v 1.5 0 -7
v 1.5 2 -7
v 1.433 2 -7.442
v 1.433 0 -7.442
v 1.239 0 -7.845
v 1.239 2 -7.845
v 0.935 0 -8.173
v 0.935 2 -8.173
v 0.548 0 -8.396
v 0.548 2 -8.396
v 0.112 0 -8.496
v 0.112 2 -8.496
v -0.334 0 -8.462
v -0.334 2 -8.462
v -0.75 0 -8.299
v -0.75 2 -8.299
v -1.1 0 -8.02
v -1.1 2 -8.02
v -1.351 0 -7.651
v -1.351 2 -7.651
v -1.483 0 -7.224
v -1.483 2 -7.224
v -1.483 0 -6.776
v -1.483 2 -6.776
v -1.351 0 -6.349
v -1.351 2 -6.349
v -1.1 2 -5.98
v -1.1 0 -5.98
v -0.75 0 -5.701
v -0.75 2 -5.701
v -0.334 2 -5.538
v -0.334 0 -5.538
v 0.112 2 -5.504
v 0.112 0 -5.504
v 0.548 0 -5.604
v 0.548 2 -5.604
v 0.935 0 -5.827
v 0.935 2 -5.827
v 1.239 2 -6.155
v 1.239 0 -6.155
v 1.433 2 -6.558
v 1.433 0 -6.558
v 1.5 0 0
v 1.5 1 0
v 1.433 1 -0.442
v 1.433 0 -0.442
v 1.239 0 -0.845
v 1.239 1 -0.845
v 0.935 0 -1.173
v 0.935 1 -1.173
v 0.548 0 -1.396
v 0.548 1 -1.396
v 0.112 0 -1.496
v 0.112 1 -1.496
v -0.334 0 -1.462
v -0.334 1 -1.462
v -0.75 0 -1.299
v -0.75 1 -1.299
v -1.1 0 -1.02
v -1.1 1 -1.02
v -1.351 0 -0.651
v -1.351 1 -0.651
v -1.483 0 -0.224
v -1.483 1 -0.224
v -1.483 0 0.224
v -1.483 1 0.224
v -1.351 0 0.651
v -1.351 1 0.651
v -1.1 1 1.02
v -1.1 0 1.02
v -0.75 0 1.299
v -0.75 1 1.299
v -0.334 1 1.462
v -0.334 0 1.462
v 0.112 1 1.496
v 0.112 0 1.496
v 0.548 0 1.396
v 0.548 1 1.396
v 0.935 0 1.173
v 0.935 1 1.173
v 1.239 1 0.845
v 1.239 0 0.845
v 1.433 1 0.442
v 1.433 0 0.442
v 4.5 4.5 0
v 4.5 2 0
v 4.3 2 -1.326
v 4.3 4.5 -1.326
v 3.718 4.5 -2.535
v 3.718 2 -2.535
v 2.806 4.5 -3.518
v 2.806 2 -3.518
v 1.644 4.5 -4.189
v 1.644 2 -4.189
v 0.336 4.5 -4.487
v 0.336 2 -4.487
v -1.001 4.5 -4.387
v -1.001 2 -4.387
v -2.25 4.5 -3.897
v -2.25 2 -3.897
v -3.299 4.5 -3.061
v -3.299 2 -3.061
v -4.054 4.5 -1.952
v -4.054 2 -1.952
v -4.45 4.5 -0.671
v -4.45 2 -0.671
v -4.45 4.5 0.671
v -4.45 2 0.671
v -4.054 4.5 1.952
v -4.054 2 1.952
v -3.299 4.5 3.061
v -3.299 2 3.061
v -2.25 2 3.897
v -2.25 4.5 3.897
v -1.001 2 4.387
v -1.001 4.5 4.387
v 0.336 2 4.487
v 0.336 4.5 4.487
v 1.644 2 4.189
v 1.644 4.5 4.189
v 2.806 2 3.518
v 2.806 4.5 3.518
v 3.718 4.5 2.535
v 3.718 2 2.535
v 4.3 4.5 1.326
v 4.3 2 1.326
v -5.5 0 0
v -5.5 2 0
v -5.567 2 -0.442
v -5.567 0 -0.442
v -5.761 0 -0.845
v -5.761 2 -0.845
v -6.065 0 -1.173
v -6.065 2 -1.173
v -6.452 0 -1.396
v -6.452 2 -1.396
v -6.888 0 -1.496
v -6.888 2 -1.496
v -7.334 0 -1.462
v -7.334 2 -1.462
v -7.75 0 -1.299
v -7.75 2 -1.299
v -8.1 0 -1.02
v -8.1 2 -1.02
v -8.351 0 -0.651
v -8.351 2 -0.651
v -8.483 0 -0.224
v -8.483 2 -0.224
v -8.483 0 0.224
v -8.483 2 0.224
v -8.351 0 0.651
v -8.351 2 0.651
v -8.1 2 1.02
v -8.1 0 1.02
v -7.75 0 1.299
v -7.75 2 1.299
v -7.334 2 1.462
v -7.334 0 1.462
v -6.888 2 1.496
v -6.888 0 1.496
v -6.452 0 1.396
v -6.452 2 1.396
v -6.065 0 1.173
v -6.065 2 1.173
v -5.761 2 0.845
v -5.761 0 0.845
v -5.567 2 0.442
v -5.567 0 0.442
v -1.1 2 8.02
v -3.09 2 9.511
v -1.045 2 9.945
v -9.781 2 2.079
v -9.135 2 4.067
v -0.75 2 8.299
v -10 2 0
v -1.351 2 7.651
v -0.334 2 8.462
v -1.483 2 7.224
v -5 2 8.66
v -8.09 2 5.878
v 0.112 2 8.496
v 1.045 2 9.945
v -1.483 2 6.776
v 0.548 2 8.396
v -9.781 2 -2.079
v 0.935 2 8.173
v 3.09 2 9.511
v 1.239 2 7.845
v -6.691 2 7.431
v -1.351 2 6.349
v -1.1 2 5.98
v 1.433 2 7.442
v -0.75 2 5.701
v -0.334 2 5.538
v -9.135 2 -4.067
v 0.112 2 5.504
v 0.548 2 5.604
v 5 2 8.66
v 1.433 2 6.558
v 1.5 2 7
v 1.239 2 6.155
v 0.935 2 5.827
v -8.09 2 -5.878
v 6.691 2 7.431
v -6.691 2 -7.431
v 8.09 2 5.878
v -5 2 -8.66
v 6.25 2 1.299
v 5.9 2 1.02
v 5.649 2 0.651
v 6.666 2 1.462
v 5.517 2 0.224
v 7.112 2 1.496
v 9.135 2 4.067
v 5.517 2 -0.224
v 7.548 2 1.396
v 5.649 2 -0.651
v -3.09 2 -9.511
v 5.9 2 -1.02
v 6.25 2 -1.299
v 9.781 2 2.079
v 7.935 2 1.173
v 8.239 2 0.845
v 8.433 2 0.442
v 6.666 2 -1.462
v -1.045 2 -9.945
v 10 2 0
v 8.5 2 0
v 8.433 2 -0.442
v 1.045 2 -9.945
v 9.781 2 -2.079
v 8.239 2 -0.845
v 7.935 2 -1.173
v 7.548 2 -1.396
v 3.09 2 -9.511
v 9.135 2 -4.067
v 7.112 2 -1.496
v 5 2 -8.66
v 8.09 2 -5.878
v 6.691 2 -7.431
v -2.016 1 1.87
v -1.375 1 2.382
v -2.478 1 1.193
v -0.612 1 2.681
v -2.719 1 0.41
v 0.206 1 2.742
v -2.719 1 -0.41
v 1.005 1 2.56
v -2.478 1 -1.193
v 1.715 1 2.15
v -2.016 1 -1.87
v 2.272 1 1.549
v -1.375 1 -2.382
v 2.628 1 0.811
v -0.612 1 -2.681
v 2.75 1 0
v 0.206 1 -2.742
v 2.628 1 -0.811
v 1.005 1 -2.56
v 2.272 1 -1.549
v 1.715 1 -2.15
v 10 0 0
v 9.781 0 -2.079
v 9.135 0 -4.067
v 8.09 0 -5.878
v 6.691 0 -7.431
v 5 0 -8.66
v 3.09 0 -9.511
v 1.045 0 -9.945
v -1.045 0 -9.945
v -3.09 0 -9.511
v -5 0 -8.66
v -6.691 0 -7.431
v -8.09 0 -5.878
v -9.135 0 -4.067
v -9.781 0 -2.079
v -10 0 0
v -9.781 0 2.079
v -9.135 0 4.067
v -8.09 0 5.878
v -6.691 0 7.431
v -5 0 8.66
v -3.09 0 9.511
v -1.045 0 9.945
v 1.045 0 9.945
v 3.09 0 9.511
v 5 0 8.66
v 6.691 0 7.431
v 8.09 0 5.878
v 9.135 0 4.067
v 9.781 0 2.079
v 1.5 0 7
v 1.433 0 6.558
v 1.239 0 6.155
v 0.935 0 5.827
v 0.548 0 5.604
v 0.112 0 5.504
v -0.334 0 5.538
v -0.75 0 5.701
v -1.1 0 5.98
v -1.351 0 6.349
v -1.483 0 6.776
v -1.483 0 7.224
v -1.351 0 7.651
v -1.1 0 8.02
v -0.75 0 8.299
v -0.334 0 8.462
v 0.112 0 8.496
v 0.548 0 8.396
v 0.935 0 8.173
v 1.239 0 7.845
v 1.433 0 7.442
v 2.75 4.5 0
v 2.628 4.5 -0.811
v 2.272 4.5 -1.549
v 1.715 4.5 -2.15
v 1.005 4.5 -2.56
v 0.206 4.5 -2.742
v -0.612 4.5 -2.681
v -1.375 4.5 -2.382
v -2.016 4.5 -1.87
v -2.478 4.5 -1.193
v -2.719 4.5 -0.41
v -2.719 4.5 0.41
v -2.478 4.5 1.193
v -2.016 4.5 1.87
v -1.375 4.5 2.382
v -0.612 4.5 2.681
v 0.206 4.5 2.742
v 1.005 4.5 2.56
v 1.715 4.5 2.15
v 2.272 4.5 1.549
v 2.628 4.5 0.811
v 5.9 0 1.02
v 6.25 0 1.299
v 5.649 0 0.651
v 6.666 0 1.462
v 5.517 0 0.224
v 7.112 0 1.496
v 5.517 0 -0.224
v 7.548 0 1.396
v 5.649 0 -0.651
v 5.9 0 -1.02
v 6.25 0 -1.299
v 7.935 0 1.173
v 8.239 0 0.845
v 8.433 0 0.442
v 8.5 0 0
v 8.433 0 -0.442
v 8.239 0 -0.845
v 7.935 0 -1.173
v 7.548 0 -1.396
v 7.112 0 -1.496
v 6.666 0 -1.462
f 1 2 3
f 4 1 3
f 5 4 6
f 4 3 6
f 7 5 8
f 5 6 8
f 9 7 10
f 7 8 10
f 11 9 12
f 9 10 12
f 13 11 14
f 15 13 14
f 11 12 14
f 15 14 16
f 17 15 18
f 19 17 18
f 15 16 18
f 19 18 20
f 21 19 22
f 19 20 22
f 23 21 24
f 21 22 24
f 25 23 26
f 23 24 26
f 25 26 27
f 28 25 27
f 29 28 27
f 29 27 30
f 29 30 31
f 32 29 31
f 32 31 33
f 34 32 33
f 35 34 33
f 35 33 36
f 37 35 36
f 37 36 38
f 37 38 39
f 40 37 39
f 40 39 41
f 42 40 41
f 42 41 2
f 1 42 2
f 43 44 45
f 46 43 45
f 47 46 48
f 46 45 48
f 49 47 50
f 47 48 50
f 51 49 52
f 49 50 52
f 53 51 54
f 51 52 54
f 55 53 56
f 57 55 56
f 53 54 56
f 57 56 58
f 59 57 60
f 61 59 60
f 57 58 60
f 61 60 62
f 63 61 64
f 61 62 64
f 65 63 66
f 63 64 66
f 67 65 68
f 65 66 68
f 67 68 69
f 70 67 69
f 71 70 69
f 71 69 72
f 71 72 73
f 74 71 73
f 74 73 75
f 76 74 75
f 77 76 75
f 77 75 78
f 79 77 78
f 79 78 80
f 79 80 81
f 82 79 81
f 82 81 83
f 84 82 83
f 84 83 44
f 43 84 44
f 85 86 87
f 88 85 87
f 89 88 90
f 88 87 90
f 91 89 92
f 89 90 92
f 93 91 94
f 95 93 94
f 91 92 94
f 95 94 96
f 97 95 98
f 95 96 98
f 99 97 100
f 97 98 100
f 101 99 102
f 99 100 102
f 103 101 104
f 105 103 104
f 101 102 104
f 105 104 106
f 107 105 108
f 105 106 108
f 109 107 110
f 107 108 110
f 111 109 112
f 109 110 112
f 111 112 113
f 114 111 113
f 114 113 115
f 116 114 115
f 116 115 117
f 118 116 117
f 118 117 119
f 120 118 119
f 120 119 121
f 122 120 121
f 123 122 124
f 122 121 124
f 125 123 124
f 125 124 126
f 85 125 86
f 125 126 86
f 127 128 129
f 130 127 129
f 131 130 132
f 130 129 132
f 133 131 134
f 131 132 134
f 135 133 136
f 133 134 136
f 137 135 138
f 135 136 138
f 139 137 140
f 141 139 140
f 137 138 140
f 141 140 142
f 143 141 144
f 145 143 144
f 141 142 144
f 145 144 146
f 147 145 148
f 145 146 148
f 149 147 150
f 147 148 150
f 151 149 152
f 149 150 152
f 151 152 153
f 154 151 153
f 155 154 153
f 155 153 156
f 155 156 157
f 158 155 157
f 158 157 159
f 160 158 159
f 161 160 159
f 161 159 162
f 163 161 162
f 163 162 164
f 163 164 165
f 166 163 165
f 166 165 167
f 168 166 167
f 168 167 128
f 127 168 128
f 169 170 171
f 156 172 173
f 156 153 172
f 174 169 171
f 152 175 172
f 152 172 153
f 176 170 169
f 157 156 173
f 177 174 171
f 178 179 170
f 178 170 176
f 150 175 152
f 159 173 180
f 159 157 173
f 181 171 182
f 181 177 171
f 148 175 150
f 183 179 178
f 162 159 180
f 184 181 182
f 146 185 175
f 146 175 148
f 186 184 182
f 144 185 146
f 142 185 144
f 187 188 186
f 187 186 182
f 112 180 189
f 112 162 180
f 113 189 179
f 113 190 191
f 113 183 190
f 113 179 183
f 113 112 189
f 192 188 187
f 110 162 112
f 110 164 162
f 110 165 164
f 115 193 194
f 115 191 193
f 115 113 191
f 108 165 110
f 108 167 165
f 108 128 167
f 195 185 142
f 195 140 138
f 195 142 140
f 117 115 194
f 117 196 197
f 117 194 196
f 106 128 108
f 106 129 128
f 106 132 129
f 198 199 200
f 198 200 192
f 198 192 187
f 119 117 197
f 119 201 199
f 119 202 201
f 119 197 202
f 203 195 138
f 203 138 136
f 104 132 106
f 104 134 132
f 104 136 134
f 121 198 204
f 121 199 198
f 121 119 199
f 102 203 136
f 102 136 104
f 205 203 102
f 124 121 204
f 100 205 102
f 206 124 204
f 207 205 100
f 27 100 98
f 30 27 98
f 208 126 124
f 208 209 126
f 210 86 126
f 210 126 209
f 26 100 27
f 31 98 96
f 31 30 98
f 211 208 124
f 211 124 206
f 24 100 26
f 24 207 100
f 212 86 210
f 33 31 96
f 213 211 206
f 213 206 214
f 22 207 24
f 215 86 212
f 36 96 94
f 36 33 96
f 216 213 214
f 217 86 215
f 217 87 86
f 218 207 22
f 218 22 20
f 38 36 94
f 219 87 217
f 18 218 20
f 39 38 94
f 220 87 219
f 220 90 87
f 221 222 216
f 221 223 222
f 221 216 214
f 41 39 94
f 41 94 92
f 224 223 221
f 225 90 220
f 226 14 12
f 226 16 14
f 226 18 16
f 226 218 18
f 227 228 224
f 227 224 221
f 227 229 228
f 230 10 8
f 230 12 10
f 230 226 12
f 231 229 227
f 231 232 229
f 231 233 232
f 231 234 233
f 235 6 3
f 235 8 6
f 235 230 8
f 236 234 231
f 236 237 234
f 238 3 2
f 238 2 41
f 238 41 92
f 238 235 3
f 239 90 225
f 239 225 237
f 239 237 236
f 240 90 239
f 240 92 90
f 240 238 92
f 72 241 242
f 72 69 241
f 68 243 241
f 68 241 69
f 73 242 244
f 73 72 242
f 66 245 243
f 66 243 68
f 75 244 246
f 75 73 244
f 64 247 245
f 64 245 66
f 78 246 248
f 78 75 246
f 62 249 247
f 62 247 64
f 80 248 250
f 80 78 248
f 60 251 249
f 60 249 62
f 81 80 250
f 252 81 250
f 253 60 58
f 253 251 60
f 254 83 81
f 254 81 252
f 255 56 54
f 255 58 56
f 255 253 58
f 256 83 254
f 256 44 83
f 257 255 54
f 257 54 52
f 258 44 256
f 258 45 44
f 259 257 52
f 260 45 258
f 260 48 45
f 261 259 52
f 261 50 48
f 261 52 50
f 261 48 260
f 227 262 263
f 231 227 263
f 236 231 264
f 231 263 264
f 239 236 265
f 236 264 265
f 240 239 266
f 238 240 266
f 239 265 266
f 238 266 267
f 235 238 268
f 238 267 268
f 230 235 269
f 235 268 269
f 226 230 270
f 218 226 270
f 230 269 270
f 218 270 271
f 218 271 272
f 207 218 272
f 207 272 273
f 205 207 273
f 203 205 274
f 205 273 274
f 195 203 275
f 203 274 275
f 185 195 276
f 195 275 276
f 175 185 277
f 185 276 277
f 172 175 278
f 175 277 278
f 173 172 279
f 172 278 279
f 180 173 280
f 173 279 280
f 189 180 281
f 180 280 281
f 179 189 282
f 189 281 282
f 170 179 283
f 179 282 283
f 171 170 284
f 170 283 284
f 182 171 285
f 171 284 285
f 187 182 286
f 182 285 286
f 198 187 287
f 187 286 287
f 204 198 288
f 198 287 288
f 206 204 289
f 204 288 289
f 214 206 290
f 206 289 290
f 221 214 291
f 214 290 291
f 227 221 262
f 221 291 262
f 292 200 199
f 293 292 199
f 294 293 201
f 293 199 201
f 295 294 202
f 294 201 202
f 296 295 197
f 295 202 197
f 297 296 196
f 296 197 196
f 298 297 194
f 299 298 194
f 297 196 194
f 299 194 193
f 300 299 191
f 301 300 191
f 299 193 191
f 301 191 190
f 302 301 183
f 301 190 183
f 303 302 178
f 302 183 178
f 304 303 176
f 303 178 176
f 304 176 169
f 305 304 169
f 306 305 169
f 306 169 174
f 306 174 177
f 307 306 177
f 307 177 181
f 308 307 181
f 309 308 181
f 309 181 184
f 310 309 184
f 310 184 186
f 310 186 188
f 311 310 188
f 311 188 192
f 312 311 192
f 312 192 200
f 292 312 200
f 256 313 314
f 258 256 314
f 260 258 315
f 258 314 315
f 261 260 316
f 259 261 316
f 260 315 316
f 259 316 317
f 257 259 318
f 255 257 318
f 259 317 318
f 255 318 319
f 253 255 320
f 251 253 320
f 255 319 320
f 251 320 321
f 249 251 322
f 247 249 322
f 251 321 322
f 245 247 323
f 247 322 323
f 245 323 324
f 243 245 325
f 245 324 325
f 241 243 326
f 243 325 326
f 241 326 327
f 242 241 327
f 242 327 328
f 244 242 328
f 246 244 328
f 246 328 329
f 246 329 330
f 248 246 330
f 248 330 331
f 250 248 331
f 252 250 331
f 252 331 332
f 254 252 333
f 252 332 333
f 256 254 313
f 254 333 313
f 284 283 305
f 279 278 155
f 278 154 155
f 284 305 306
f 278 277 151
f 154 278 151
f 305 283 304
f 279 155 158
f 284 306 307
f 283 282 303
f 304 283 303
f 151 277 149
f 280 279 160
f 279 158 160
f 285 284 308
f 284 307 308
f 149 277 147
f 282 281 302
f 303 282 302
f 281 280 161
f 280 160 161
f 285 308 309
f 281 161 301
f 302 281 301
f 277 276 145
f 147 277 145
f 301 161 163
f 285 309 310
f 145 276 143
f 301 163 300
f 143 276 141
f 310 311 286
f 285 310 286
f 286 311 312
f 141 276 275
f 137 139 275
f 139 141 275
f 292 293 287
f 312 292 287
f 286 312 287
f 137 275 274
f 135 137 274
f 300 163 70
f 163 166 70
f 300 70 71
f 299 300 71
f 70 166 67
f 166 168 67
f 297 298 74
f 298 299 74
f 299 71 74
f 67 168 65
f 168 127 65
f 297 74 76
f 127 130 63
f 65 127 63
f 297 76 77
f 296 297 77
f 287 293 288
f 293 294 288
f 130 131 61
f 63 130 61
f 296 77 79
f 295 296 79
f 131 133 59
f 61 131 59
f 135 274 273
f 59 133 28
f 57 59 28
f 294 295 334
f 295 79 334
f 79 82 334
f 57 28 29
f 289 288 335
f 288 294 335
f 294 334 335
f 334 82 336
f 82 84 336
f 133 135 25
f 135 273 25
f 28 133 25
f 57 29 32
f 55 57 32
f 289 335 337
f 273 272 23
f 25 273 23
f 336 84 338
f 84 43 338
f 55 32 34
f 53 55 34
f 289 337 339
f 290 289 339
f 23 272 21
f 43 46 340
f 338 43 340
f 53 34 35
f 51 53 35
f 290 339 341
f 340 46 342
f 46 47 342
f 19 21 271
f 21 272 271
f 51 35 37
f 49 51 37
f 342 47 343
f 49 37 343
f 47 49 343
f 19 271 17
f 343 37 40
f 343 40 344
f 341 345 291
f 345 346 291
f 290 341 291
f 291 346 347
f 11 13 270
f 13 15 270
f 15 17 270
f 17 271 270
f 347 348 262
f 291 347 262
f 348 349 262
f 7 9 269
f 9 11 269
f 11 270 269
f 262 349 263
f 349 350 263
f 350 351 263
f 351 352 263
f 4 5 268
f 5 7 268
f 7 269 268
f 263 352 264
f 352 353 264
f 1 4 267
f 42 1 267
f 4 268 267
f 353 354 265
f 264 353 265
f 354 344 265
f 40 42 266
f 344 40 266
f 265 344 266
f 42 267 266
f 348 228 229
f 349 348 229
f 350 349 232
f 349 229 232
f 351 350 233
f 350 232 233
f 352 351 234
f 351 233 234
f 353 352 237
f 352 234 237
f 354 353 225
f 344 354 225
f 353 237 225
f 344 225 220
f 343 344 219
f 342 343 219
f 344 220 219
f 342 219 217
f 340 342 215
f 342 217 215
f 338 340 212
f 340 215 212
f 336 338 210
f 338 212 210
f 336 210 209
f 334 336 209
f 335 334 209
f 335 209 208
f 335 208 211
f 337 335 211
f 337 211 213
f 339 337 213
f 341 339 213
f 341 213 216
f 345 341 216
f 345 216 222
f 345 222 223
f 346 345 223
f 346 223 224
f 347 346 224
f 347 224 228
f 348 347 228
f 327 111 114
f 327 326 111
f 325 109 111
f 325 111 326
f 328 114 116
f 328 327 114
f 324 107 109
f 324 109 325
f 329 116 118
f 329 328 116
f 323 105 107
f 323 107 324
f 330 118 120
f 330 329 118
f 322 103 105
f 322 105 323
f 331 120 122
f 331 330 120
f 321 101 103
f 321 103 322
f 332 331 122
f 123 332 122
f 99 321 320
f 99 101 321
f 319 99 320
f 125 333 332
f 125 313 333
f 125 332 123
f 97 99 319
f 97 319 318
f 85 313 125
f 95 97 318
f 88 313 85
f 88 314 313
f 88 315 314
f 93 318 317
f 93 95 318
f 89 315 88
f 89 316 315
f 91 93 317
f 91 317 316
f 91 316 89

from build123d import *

# Parameters (mm, degrees)
SKETCH1_R           = 10
BOSS_EXTRUDE1_DEPTH = 2
SKETCH2_R           = 4.5
BOSS_EXTRUDE2_DEPTH = 2.5
SKETCH3_R           = 2.75
CUT_EXTRUDE1_DEPTH  = 3.5
SKETCH4_R           = 1.5
CUT_EXTRUDE2_DEPTH  = 2
SKETCH5_R           = 1.5
CUT_EXTRUDE3_DEPTH  = 3


with BuildPart() as part:
    # Sketch1 → Boss-Extrude1 (new body)
    with BuildSketch(Plane(origin=(0, 0, 0), x_dir=(1, 0, 0), z_dir=(0, 1, 0))):
        Circle(SKETCH1_R)
    extrude(amount=BOSS_EXTRUDE1_DEPTH)

    # Sketch2 → Boss-Extrude2 (add)
    with BuildSketch(Plane(origin=(0, 2, 0), x_dir=(1, 0, 0), z_dir=(0, 1, 0))):
        Circle(SKETCH2_R)
    extrude(amount=BOSS_EXTRUDE2_DEPTH)

    # Sketch3 → Cut-Extrude1 (cut)
    with BuildSketch(Plane(origin=(0, 4.5, 0), x_dir=(1, 0, 0), z_dir=(0, 1, 0))):
        Circle(SKETCH3_R)
    extrude(amount=-CUT_EXTRUDE1_DEPTH, mode=Mode.SUBTRACT)

    # Sketch4 → Cut-Extrude2 (cut, through all)
    with BuildSketch(Plane(origin=(0, 1, 0), x_dir=(1, 0, 0), z_dir=(0, 1, 0))):
        Circle(SKETCH4_R)
    extrude(amount=-CUT_EXTRUDE2_DEPTH, mode=Mode.SUBTRACT)

    # Sketch5 → Cut-Extrude3 (cut, through all)
    with BuildSketch(Plane(origin=(0, 2, 0), x_dir=(1, 0, 0), z_dir=(0, 1, 0))):
        with Locations((0, 7)):
            Circle(SKETCH5_R)
        with Locations((7, 0)):
            Circle(SKETCH5_R)
        with Locations((0, -7)):
            Circle(SKETCH5_R)
        with Locations((-7, 0)):
            Circle(SKETCH5_R)
    extrude(amount=-CUT_EXTRUDE3_DEPTH, mode=Mode.SUBTRACT)


solid = part.part
